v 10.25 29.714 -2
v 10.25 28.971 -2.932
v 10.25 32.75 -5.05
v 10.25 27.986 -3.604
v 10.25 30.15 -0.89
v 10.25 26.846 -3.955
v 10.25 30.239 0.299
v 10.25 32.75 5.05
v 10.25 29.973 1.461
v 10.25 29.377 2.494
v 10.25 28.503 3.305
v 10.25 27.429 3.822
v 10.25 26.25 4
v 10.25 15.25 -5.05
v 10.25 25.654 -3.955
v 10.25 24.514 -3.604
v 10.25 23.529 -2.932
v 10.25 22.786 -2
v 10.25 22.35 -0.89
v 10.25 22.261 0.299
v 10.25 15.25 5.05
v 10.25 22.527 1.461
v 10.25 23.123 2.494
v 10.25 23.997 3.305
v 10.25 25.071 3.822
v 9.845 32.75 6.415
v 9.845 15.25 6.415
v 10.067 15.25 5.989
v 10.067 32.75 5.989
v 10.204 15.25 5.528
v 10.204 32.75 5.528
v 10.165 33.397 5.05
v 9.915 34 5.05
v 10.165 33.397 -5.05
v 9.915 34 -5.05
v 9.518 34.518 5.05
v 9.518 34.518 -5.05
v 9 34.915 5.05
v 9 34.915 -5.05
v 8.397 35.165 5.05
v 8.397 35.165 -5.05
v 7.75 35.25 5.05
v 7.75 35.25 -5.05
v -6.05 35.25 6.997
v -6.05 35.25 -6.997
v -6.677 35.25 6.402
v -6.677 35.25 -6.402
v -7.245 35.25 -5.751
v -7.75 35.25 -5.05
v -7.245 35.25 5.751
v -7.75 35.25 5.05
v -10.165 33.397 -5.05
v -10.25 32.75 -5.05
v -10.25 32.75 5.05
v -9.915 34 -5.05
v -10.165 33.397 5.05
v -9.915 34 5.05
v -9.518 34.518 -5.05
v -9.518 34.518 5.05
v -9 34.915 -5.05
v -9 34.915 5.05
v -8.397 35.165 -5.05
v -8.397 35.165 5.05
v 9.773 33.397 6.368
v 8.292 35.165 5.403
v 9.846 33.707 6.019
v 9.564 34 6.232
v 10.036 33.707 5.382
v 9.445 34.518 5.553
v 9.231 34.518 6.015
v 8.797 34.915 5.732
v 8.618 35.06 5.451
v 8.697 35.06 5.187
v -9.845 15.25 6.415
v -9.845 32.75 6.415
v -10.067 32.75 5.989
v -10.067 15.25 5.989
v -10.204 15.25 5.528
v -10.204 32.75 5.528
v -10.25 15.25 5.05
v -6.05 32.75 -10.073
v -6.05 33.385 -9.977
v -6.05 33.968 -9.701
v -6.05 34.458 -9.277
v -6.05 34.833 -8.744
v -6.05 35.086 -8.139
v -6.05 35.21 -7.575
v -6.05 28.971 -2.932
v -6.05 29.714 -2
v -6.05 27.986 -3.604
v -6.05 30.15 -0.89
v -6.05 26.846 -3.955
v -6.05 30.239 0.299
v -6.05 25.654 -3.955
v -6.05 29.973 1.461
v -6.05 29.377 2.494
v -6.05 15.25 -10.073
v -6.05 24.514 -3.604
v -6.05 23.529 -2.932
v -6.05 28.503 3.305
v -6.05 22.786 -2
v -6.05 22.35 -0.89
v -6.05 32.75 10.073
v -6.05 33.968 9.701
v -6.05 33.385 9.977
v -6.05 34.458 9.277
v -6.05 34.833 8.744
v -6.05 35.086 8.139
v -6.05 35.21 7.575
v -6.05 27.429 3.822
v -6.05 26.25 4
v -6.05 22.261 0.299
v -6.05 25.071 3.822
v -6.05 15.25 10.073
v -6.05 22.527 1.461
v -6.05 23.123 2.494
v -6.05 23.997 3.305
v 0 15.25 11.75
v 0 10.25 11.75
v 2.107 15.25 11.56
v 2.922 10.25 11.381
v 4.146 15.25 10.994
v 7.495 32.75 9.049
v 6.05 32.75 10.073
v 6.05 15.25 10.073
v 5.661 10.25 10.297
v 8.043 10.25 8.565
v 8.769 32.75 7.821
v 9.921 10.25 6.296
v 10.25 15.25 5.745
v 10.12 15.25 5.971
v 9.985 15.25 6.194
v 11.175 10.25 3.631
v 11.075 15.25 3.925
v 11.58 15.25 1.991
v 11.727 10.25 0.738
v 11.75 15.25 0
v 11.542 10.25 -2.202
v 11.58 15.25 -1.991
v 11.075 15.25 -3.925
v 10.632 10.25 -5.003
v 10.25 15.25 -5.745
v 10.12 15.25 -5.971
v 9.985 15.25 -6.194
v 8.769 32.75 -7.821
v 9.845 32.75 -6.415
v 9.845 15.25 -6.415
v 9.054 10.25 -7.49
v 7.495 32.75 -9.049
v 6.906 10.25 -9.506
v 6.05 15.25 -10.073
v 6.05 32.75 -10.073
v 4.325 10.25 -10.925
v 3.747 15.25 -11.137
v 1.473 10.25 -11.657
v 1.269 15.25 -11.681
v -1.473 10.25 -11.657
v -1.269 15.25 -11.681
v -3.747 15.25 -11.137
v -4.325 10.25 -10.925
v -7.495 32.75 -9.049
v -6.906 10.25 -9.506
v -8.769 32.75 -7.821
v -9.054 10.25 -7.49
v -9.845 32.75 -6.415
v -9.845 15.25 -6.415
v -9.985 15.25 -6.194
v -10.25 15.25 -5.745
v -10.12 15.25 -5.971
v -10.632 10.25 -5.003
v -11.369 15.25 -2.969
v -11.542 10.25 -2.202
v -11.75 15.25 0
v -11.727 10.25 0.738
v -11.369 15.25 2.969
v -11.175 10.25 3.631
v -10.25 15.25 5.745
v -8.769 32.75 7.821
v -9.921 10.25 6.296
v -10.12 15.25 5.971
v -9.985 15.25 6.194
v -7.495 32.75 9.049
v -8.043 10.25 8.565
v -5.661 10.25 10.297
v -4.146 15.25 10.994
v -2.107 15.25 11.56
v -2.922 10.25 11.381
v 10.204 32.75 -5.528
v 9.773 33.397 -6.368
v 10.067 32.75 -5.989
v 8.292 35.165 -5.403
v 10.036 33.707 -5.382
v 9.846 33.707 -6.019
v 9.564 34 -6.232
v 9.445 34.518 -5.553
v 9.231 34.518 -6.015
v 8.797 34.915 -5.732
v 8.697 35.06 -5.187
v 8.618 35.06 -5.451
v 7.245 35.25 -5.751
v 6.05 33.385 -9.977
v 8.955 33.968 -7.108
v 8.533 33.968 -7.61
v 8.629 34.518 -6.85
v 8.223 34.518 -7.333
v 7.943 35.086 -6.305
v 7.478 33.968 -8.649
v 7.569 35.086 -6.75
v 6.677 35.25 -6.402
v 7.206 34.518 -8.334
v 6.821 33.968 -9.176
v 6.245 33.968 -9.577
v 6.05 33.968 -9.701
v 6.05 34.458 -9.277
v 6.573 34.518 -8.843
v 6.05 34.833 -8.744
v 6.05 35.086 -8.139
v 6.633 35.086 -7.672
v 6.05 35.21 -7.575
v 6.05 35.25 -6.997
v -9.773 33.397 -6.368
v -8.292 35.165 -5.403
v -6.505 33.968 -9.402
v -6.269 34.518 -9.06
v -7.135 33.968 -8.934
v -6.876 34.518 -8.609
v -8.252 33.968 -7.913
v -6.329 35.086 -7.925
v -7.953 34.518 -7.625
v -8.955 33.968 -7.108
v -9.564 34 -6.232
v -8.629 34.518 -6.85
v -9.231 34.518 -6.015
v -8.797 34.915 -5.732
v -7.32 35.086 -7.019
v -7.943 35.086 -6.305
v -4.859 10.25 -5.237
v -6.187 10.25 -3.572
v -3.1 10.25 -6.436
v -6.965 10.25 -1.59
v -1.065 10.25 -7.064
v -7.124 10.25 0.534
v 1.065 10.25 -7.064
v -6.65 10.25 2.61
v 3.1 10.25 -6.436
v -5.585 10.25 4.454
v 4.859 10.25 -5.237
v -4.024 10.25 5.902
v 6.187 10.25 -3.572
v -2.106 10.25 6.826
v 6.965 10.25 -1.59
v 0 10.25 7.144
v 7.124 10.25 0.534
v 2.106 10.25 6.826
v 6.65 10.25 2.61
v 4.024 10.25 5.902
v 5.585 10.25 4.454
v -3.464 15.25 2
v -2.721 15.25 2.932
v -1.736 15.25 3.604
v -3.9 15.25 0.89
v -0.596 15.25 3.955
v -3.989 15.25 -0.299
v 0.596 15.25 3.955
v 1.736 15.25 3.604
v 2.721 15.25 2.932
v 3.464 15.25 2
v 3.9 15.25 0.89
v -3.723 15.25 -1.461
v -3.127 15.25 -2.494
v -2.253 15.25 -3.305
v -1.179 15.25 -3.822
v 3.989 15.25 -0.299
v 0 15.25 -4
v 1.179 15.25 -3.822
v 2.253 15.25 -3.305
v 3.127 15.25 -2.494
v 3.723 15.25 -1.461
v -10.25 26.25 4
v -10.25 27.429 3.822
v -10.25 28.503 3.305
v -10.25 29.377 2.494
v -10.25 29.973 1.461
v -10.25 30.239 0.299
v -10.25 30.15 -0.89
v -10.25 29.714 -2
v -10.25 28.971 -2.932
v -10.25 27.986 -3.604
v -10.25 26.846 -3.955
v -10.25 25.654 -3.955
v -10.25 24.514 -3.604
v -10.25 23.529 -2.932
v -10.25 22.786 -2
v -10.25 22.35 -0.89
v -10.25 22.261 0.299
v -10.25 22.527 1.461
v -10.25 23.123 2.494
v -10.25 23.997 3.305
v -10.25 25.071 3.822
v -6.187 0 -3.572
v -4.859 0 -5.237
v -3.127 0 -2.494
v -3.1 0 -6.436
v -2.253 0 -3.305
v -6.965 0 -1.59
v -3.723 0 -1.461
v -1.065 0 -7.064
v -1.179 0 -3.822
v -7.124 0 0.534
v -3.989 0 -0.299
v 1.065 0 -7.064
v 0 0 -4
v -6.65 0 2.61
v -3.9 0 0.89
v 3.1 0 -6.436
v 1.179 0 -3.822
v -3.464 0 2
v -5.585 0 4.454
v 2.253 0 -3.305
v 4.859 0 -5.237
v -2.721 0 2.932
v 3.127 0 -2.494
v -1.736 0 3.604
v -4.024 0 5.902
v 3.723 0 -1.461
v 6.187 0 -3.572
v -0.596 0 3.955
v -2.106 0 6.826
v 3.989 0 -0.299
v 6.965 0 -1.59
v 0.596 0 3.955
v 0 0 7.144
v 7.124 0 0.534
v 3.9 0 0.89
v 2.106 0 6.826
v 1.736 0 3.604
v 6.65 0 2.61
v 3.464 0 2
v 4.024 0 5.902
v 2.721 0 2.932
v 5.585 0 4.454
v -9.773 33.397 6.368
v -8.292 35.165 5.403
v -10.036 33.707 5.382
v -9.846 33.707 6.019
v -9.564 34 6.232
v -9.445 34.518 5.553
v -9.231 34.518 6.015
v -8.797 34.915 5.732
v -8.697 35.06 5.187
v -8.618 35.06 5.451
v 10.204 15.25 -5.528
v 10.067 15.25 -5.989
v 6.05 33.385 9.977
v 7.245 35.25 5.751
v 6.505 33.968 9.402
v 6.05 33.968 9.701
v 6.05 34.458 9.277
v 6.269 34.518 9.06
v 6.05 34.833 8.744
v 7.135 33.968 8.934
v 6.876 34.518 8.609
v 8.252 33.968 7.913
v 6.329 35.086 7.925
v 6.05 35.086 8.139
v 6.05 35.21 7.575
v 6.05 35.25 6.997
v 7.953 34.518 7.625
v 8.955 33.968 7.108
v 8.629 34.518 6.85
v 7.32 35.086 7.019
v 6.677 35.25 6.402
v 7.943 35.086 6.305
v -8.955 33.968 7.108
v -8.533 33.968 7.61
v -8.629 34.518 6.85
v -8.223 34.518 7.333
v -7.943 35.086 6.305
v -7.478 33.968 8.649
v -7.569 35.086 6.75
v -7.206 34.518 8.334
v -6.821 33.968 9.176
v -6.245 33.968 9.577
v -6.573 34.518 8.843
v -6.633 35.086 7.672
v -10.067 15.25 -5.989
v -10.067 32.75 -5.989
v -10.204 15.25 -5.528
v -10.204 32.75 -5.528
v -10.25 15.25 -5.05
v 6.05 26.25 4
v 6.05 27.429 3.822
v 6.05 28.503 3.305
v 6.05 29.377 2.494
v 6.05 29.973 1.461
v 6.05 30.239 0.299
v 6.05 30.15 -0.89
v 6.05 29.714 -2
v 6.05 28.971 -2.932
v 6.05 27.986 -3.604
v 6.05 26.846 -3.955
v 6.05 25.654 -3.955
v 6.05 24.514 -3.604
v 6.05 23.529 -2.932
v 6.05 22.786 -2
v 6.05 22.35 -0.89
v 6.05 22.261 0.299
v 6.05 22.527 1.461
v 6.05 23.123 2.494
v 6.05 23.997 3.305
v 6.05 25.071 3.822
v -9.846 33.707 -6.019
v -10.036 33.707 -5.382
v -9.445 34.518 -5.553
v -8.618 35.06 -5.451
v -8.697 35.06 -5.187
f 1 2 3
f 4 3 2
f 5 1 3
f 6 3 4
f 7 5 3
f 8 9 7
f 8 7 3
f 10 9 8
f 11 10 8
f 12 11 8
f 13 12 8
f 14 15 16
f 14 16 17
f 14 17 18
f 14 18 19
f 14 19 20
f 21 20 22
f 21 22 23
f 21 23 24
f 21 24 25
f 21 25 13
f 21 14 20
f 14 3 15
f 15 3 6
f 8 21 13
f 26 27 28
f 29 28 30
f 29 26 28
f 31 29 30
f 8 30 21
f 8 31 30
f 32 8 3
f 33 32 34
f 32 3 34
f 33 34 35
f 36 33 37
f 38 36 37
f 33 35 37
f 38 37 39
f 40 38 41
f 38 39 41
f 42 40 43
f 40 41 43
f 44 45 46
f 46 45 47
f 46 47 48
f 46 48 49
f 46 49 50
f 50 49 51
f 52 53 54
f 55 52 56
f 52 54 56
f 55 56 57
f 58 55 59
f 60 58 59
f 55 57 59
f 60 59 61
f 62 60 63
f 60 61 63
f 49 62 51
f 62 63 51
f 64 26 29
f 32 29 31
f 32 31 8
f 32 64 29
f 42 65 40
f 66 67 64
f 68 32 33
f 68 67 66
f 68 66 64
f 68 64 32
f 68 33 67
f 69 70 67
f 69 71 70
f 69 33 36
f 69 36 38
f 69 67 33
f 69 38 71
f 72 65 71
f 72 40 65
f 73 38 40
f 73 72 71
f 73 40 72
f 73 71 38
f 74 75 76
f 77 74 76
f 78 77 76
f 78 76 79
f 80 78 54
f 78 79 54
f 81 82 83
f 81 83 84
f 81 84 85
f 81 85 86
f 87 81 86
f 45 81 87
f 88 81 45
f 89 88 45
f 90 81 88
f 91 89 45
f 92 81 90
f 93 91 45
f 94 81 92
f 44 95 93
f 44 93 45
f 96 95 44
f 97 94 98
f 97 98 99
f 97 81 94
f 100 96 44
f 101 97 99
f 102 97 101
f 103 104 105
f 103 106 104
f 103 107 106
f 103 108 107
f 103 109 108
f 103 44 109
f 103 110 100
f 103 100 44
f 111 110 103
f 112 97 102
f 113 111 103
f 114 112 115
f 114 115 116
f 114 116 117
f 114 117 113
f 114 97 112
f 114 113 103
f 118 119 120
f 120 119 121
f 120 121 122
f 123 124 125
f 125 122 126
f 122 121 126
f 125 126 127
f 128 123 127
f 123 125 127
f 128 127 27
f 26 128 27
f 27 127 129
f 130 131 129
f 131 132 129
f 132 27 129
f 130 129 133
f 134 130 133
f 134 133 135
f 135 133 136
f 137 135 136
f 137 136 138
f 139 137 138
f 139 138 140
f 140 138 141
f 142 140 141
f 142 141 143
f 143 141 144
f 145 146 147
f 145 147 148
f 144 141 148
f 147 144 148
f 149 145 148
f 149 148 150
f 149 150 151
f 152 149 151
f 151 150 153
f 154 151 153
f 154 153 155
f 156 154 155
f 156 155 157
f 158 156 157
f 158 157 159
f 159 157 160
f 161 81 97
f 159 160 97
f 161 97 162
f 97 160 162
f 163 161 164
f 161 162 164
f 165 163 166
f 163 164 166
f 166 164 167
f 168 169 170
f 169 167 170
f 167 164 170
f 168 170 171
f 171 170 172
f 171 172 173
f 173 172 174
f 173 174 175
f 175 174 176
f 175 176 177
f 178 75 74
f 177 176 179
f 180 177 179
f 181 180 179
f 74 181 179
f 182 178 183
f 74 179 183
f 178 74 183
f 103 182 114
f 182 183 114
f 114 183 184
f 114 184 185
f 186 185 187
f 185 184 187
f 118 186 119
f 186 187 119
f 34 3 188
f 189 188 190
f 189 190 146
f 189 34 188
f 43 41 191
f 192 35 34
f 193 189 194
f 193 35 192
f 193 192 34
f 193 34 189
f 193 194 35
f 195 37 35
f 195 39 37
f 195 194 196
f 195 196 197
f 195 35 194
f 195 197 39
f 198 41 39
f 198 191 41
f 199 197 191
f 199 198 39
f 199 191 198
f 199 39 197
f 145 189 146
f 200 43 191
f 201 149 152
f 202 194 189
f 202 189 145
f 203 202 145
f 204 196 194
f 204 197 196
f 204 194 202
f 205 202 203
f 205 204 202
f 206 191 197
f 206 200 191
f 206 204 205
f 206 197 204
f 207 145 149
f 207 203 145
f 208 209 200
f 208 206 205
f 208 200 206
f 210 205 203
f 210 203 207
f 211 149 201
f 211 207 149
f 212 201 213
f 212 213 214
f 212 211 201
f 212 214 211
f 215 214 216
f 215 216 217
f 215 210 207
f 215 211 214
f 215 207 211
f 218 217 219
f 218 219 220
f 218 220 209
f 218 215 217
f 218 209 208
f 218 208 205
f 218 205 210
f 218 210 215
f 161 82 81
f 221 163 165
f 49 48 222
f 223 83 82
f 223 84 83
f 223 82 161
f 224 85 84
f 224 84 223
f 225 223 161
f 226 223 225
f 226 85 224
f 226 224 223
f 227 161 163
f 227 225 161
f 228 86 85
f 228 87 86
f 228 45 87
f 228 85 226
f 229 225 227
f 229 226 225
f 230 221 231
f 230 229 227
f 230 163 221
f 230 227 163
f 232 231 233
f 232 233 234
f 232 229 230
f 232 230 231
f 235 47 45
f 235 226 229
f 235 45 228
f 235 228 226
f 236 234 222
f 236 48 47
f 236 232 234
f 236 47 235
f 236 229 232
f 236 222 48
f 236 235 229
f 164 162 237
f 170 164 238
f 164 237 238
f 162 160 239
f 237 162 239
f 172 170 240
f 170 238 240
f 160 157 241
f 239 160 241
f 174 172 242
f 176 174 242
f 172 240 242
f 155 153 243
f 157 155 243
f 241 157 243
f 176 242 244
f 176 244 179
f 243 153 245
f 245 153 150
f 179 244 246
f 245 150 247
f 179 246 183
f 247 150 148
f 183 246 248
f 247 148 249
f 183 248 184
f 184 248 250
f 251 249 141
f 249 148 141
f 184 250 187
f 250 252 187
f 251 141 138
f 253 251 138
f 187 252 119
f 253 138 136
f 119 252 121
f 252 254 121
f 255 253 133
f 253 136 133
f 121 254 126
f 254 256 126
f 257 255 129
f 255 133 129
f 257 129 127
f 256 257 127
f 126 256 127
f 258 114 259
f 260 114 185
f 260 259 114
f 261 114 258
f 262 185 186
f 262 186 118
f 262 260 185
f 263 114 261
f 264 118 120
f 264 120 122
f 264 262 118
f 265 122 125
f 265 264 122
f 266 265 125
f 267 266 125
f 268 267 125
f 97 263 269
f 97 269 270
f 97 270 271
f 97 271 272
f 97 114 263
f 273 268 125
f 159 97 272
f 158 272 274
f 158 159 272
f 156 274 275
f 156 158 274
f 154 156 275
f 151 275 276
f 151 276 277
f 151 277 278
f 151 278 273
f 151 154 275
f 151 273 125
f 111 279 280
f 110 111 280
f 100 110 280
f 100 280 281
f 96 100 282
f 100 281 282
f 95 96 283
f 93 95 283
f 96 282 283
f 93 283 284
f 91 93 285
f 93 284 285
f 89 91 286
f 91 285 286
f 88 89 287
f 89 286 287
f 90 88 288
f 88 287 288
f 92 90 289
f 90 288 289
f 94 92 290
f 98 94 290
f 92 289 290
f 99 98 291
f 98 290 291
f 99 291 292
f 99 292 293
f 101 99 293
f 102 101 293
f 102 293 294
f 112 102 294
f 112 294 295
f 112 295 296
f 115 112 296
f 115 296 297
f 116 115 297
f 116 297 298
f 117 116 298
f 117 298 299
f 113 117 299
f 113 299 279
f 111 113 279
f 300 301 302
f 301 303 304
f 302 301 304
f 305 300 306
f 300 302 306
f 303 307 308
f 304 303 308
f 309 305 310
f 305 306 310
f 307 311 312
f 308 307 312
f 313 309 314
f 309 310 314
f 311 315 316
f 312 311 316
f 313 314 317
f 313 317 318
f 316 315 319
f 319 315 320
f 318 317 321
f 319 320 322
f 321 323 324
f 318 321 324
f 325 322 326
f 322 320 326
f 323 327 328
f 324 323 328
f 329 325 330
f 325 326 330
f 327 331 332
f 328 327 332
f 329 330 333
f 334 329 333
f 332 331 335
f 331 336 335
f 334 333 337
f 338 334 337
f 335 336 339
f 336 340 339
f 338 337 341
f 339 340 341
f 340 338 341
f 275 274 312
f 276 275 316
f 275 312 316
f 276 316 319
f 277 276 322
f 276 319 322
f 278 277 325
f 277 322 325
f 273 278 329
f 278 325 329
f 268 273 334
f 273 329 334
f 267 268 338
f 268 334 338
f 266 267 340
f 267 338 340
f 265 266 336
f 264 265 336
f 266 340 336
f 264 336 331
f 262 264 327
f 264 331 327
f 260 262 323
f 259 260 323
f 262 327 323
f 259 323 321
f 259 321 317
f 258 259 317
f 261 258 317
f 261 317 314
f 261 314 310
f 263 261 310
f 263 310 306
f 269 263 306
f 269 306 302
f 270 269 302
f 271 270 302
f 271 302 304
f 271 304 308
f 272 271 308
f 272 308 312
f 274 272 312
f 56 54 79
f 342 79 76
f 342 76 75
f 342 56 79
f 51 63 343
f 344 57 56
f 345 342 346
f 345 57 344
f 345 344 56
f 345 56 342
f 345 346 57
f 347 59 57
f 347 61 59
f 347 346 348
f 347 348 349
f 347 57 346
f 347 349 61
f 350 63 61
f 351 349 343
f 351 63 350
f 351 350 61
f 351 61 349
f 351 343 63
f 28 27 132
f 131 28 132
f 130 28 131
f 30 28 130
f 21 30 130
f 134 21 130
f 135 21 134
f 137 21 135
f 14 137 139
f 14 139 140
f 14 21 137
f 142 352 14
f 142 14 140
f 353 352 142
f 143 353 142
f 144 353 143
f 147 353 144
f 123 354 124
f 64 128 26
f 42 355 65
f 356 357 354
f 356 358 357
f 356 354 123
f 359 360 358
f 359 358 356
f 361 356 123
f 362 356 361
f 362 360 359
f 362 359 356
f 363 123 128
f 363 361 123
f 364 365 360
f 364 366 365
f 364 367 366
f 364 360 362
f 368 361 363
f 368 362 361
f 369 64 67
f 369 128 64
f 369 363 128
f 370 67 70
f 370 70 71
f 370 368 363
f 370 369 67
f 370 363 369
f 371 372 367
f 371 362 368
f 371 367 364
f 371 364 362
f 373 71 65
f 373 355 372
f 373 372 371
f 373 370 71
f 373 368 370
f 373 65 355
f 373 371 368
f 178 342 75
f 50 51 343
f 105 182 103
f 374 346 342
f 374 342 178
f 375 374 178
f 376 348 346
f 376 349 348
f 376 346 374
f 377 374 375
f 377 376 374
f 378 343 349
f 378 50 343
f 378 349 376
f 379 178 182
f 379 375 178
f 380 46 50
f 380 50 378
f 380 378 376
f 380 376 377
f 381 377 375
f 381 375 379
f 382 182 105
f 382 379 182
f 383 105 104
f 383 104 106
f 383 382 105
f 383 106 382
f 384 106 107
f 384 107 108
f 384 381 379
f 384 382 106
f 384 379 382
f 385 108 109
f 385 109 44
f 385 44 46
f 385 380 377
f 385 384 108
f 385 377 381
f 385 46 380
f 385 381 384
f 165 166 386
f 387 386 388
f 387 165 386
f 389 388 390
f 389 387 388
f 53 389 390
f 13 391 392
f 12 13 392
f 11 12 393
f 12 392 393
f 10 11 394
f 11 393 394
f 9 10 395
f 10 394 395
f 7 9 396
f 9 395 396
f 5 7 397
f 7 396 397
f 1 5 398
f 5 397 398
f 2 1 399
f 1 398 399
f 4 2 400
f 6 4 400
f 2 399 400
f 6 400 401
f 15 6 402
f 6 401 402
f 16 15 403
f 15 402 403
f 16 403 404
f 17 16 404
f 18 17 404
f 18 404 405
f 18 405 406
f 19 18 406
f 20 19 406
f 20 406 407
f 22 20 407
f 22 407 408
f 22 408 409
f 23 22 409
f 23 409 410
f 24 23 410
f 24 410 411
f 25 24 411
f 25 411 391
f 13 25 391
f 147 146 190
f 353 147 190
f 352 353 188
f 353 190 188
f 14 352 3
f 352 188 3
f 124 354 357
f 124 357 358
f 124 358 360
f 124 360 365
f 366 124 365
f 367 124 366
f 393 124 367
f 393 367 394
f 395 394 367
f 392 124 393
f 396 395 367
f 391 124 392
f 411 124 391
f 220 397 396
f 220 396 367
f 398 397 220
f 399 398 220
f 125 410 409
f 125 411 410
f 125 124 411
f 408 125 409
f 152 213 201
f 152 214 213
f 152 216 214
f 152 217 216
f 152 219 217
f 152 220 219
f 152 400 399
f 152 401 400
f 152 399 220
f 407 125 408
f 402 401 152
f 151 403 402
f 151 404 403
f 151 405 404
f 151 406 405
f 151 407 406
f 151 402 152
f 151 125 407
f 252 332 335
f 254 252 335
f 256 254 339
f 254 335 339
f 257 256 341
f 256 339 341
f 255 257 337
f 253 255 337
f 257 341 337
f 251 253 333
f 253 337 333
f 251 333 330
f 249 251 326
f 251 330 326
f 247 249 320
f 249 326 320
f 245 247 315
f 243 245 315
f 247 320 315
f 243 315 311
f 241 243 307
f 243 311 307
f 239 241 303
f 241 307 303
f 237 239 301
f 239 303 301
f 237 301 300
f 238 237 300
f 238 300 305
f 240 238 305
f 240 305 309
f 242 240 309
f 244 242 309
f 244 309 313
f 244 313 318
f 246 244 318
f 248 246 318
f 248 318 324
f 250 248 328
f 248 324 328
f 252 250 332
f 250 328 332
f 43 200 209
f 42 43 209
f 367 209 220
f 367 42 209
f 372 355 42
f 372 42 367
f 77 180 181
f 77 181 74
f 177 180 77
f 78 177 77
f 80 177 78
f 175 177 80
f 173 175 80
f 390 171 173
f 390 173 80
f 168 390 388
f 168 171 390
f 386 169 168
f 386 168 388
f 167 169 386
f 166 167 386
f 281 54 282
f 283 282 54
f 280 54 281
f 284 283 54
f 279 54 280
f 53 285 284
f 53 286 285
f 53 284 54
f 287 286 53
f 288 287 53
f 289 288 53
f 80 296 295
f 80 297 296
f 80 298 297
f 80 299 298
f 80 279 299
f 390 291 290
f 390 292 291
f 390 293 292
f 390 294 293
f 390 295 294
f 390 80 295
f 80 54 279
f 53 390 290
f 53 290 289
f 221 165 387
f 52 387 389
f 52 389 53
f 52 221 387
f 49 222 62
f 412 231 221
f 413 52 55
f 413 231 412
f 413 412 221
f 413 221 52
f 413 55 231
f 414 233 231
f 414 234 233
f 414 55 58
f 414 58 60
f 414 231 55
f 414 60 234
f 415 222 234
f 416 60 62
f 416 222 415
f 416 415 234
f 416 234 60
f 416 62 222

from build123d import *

# Parameters (mm, degrees)
SKETCH1_R           = 7.14375
BOSS_EXTRUDE1_DEPTH = 10.25
SKETCH2_R           = 11.75
BOSS_EXTRUDE2_DEPTH = 25
SKETCH6_R           = 4
CUT_EXTRUDE4_DEPTH  = 20
CUT_EXTRUDE5_START  = -20
CUT_EXTRUDE5_DEPTH  = 20
SKETCH7_R           = 4
CUT_EXTRUDE6_DEPTH  = 30
FILLET1_R           = 2.5
FILLET2_R           = 2.5


with BuildPart() as part:
    # Sketch1 → Boss-Extrude1 (new body)
    with BuildSketch(Plane(origin=(0, 0, 0), x_dir=(1, 0, 0), z_dir=(0, 1, 0))):
        with Locations(Location((0, 0, 0), (0, 0, 270))):
            Circle(SKETCH1_R)
    extrude(amount=BOSS_EXTRUDE1_DEPTH)

    # Sketch2 → Boss-Extrude2 (add)
    with BuildSketch(Plane(origin=(0, 10.25, 0), x_dir=(1, 0, 0), z_dir=(0, 1, 0))):
        with Locations(Location((0, 0, 0), (0, 0, 270))):
            Circle(SKETCH2_R)
    extrude(amount=BOSS_EXTRUDE2_DEPTH)

    # Sketch6 → Cut-Extrude4 (cut)
    with BuildSketch(Plane.XZ):
        with Locations(Location((0, 0, 0), (0, 0, 270))):
            Circle(SKETCH6_R)
    extrude(amount=-CUT_EXTRUDE4_DEPTH, mode=Mode.SUBTRACT)

    # Sketch3 → Cut-Extrude5 (cut)
    with BuildSketch(Plane(origin=(0, 35.25, 0), x_dir=(1, 0, 0), z_dir=(0, 1, 0)).offset(CUT_EXTRUDE5_START)):
        with BuildLine():
            ThreePointArc((6.05, 10.072735478), (0, 11.75), (-6.05, 10.072735478))
            Line((-6.05, 10.072735478), (-6.05, -10.072735478))
            ThreePointArc((-6.05, -10.072735478), (0, -11.75), (6.05, -10.072735478))
            Line((6.05, -10.072735478), (6.05, 10.072735478))
        make_face()
        with BuildLine():
            Line((-10.25, -5.744562647), (-10.25, 5.744562647))
            ThreePointArc((-10.25, 5.744562647), (-11.75, 0), (-10.25, -5.744562647))
        make_face()
        with BuildLine():
            ThreePointArc((11.75, 0), (11.368817001, 2.968585522), (10.25, 5.744562647))
            Line((10.25, 5.744562647), (10.25, -5.744562647))
            ThreePointArc((10.25, -5.744562647), (11.368817001, -2.968585522), (11.75, 0))
        make_face()
    extrude(amount=CUT_EXTRUDE5_DEPTH, mode=Mode.SUBTRACT)

    # Sketch7 → Cut-Extrude6 (cut)
    with BuildSketch(Plane.ZY.offset(10.25)):
        with Locations((0, 26.25)):
            Circle(SKETCH7_R)
    extrude(amount=-CUT_EXTRUDE6_DEPTH, mode=Mode.SUBTRACT)

    # Fillet1
    fillet1_edges = [part.edges().sort_by_distance(p)[0] for p in [
        (10.25, 25.25, -5.744562647),
        (10.25, 25.25, 5.744562647),
        (-10.25, 25.25, -5.744562647),
        (-10.25, 25.25, 5.744562647),
    ]]
    fillet(fillet1_edges, radius=FILLET1_R)

    # Fillet2
    fillet2_edges = [part.edges().sort_by_distance(p)[0] for p in [
        (-8.155066755, 35.25, -8.4591599),
        (8.155066755, 35.25, 8.4591599),
        (8.155066755, 35.25, -8.4591599),
        (-8.155066755, 35.25, 8.4591599),
        (10.25, 35.25, 0),
        (10.146506466, 35.25, -5.761620966),
        (10.146506466, 35.25, 5.761620966),
        (-10.25, 35.25, 0),
        (-10.146506466, 35.25, -5.761620966),
        (-10.146506466, 35.25, 5.761620966),
    ]]
    fillet(fillet2_edges, radius=FILLET2_R)


solid = part.part
